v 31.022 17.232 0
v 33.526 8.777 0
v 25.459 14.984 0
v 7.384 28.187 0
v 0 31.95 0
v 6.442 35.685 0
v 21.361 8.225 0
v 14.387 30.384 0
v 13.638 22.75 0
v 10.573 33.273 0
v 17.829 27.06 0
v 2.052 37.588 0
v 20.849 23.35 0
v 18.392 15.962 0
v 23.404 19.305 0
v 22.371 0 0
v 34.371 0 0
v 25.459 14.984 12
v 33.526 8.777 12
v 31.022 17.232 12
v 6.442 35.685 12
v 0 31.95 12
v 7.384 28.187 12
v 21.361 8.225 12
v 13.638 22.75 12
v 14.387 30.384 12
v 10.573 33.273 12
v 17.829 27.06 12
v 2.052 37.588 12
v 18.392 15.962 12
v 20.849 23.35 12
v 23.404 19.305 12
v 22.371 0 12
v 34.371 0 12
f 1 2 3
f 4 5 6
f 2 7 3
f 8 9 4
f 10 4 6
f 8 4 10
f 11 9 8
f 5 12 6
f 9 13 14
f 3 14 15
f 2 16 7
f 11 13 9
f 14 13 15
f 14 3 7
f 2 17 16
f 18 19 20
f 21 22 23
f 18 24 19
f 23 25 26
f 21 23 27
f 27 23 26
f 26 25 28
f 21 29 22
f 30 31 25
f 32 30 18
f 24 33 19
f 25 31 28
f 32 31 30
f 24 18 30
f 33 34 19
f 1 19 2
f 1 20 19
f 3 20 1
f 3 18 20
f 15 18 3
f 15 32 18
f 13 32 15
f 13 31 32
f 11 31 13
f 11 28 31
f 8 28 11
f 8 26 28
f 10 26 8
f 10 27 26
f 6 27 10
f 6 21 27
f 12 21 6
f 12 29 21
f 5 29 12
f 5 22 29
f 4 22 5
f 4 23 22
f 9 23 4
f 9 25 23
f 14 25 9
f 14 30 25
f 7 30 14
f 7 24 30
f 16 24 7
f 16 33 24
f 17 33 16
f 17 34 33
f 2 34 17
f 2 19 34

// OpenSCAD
$fn = 32;

// ----------------------------------------------------------------------
// Arc stop: segment, 12 mm thick
// ----------------------------------------------------------------------

// --- parameters (mm) ---
profile_height = 12;      // extrusion height
profile_points = 17;      // points of the closed outline

profile = [[34.371, 0], [33.526, 8.777], [31.022, 17.232], [25.459, 14.984], [23.404, 19.305], [20.849, 23.35], [17.829, 27.06], [14.387, 30.384], [10.573, 33.273], [6.442, 35.685], [2.052, 37.588], [0, 31.95], [7.384, 28.187], [13.638, 22.75], [18.392, 15.962], [21.361, 8.225], [22.371, 0]];  // single closed polygon, 17 points, counter clockwise

// --- the one profile operation ---
linear_extrude(height = profile_height) polygon(points = profile);
